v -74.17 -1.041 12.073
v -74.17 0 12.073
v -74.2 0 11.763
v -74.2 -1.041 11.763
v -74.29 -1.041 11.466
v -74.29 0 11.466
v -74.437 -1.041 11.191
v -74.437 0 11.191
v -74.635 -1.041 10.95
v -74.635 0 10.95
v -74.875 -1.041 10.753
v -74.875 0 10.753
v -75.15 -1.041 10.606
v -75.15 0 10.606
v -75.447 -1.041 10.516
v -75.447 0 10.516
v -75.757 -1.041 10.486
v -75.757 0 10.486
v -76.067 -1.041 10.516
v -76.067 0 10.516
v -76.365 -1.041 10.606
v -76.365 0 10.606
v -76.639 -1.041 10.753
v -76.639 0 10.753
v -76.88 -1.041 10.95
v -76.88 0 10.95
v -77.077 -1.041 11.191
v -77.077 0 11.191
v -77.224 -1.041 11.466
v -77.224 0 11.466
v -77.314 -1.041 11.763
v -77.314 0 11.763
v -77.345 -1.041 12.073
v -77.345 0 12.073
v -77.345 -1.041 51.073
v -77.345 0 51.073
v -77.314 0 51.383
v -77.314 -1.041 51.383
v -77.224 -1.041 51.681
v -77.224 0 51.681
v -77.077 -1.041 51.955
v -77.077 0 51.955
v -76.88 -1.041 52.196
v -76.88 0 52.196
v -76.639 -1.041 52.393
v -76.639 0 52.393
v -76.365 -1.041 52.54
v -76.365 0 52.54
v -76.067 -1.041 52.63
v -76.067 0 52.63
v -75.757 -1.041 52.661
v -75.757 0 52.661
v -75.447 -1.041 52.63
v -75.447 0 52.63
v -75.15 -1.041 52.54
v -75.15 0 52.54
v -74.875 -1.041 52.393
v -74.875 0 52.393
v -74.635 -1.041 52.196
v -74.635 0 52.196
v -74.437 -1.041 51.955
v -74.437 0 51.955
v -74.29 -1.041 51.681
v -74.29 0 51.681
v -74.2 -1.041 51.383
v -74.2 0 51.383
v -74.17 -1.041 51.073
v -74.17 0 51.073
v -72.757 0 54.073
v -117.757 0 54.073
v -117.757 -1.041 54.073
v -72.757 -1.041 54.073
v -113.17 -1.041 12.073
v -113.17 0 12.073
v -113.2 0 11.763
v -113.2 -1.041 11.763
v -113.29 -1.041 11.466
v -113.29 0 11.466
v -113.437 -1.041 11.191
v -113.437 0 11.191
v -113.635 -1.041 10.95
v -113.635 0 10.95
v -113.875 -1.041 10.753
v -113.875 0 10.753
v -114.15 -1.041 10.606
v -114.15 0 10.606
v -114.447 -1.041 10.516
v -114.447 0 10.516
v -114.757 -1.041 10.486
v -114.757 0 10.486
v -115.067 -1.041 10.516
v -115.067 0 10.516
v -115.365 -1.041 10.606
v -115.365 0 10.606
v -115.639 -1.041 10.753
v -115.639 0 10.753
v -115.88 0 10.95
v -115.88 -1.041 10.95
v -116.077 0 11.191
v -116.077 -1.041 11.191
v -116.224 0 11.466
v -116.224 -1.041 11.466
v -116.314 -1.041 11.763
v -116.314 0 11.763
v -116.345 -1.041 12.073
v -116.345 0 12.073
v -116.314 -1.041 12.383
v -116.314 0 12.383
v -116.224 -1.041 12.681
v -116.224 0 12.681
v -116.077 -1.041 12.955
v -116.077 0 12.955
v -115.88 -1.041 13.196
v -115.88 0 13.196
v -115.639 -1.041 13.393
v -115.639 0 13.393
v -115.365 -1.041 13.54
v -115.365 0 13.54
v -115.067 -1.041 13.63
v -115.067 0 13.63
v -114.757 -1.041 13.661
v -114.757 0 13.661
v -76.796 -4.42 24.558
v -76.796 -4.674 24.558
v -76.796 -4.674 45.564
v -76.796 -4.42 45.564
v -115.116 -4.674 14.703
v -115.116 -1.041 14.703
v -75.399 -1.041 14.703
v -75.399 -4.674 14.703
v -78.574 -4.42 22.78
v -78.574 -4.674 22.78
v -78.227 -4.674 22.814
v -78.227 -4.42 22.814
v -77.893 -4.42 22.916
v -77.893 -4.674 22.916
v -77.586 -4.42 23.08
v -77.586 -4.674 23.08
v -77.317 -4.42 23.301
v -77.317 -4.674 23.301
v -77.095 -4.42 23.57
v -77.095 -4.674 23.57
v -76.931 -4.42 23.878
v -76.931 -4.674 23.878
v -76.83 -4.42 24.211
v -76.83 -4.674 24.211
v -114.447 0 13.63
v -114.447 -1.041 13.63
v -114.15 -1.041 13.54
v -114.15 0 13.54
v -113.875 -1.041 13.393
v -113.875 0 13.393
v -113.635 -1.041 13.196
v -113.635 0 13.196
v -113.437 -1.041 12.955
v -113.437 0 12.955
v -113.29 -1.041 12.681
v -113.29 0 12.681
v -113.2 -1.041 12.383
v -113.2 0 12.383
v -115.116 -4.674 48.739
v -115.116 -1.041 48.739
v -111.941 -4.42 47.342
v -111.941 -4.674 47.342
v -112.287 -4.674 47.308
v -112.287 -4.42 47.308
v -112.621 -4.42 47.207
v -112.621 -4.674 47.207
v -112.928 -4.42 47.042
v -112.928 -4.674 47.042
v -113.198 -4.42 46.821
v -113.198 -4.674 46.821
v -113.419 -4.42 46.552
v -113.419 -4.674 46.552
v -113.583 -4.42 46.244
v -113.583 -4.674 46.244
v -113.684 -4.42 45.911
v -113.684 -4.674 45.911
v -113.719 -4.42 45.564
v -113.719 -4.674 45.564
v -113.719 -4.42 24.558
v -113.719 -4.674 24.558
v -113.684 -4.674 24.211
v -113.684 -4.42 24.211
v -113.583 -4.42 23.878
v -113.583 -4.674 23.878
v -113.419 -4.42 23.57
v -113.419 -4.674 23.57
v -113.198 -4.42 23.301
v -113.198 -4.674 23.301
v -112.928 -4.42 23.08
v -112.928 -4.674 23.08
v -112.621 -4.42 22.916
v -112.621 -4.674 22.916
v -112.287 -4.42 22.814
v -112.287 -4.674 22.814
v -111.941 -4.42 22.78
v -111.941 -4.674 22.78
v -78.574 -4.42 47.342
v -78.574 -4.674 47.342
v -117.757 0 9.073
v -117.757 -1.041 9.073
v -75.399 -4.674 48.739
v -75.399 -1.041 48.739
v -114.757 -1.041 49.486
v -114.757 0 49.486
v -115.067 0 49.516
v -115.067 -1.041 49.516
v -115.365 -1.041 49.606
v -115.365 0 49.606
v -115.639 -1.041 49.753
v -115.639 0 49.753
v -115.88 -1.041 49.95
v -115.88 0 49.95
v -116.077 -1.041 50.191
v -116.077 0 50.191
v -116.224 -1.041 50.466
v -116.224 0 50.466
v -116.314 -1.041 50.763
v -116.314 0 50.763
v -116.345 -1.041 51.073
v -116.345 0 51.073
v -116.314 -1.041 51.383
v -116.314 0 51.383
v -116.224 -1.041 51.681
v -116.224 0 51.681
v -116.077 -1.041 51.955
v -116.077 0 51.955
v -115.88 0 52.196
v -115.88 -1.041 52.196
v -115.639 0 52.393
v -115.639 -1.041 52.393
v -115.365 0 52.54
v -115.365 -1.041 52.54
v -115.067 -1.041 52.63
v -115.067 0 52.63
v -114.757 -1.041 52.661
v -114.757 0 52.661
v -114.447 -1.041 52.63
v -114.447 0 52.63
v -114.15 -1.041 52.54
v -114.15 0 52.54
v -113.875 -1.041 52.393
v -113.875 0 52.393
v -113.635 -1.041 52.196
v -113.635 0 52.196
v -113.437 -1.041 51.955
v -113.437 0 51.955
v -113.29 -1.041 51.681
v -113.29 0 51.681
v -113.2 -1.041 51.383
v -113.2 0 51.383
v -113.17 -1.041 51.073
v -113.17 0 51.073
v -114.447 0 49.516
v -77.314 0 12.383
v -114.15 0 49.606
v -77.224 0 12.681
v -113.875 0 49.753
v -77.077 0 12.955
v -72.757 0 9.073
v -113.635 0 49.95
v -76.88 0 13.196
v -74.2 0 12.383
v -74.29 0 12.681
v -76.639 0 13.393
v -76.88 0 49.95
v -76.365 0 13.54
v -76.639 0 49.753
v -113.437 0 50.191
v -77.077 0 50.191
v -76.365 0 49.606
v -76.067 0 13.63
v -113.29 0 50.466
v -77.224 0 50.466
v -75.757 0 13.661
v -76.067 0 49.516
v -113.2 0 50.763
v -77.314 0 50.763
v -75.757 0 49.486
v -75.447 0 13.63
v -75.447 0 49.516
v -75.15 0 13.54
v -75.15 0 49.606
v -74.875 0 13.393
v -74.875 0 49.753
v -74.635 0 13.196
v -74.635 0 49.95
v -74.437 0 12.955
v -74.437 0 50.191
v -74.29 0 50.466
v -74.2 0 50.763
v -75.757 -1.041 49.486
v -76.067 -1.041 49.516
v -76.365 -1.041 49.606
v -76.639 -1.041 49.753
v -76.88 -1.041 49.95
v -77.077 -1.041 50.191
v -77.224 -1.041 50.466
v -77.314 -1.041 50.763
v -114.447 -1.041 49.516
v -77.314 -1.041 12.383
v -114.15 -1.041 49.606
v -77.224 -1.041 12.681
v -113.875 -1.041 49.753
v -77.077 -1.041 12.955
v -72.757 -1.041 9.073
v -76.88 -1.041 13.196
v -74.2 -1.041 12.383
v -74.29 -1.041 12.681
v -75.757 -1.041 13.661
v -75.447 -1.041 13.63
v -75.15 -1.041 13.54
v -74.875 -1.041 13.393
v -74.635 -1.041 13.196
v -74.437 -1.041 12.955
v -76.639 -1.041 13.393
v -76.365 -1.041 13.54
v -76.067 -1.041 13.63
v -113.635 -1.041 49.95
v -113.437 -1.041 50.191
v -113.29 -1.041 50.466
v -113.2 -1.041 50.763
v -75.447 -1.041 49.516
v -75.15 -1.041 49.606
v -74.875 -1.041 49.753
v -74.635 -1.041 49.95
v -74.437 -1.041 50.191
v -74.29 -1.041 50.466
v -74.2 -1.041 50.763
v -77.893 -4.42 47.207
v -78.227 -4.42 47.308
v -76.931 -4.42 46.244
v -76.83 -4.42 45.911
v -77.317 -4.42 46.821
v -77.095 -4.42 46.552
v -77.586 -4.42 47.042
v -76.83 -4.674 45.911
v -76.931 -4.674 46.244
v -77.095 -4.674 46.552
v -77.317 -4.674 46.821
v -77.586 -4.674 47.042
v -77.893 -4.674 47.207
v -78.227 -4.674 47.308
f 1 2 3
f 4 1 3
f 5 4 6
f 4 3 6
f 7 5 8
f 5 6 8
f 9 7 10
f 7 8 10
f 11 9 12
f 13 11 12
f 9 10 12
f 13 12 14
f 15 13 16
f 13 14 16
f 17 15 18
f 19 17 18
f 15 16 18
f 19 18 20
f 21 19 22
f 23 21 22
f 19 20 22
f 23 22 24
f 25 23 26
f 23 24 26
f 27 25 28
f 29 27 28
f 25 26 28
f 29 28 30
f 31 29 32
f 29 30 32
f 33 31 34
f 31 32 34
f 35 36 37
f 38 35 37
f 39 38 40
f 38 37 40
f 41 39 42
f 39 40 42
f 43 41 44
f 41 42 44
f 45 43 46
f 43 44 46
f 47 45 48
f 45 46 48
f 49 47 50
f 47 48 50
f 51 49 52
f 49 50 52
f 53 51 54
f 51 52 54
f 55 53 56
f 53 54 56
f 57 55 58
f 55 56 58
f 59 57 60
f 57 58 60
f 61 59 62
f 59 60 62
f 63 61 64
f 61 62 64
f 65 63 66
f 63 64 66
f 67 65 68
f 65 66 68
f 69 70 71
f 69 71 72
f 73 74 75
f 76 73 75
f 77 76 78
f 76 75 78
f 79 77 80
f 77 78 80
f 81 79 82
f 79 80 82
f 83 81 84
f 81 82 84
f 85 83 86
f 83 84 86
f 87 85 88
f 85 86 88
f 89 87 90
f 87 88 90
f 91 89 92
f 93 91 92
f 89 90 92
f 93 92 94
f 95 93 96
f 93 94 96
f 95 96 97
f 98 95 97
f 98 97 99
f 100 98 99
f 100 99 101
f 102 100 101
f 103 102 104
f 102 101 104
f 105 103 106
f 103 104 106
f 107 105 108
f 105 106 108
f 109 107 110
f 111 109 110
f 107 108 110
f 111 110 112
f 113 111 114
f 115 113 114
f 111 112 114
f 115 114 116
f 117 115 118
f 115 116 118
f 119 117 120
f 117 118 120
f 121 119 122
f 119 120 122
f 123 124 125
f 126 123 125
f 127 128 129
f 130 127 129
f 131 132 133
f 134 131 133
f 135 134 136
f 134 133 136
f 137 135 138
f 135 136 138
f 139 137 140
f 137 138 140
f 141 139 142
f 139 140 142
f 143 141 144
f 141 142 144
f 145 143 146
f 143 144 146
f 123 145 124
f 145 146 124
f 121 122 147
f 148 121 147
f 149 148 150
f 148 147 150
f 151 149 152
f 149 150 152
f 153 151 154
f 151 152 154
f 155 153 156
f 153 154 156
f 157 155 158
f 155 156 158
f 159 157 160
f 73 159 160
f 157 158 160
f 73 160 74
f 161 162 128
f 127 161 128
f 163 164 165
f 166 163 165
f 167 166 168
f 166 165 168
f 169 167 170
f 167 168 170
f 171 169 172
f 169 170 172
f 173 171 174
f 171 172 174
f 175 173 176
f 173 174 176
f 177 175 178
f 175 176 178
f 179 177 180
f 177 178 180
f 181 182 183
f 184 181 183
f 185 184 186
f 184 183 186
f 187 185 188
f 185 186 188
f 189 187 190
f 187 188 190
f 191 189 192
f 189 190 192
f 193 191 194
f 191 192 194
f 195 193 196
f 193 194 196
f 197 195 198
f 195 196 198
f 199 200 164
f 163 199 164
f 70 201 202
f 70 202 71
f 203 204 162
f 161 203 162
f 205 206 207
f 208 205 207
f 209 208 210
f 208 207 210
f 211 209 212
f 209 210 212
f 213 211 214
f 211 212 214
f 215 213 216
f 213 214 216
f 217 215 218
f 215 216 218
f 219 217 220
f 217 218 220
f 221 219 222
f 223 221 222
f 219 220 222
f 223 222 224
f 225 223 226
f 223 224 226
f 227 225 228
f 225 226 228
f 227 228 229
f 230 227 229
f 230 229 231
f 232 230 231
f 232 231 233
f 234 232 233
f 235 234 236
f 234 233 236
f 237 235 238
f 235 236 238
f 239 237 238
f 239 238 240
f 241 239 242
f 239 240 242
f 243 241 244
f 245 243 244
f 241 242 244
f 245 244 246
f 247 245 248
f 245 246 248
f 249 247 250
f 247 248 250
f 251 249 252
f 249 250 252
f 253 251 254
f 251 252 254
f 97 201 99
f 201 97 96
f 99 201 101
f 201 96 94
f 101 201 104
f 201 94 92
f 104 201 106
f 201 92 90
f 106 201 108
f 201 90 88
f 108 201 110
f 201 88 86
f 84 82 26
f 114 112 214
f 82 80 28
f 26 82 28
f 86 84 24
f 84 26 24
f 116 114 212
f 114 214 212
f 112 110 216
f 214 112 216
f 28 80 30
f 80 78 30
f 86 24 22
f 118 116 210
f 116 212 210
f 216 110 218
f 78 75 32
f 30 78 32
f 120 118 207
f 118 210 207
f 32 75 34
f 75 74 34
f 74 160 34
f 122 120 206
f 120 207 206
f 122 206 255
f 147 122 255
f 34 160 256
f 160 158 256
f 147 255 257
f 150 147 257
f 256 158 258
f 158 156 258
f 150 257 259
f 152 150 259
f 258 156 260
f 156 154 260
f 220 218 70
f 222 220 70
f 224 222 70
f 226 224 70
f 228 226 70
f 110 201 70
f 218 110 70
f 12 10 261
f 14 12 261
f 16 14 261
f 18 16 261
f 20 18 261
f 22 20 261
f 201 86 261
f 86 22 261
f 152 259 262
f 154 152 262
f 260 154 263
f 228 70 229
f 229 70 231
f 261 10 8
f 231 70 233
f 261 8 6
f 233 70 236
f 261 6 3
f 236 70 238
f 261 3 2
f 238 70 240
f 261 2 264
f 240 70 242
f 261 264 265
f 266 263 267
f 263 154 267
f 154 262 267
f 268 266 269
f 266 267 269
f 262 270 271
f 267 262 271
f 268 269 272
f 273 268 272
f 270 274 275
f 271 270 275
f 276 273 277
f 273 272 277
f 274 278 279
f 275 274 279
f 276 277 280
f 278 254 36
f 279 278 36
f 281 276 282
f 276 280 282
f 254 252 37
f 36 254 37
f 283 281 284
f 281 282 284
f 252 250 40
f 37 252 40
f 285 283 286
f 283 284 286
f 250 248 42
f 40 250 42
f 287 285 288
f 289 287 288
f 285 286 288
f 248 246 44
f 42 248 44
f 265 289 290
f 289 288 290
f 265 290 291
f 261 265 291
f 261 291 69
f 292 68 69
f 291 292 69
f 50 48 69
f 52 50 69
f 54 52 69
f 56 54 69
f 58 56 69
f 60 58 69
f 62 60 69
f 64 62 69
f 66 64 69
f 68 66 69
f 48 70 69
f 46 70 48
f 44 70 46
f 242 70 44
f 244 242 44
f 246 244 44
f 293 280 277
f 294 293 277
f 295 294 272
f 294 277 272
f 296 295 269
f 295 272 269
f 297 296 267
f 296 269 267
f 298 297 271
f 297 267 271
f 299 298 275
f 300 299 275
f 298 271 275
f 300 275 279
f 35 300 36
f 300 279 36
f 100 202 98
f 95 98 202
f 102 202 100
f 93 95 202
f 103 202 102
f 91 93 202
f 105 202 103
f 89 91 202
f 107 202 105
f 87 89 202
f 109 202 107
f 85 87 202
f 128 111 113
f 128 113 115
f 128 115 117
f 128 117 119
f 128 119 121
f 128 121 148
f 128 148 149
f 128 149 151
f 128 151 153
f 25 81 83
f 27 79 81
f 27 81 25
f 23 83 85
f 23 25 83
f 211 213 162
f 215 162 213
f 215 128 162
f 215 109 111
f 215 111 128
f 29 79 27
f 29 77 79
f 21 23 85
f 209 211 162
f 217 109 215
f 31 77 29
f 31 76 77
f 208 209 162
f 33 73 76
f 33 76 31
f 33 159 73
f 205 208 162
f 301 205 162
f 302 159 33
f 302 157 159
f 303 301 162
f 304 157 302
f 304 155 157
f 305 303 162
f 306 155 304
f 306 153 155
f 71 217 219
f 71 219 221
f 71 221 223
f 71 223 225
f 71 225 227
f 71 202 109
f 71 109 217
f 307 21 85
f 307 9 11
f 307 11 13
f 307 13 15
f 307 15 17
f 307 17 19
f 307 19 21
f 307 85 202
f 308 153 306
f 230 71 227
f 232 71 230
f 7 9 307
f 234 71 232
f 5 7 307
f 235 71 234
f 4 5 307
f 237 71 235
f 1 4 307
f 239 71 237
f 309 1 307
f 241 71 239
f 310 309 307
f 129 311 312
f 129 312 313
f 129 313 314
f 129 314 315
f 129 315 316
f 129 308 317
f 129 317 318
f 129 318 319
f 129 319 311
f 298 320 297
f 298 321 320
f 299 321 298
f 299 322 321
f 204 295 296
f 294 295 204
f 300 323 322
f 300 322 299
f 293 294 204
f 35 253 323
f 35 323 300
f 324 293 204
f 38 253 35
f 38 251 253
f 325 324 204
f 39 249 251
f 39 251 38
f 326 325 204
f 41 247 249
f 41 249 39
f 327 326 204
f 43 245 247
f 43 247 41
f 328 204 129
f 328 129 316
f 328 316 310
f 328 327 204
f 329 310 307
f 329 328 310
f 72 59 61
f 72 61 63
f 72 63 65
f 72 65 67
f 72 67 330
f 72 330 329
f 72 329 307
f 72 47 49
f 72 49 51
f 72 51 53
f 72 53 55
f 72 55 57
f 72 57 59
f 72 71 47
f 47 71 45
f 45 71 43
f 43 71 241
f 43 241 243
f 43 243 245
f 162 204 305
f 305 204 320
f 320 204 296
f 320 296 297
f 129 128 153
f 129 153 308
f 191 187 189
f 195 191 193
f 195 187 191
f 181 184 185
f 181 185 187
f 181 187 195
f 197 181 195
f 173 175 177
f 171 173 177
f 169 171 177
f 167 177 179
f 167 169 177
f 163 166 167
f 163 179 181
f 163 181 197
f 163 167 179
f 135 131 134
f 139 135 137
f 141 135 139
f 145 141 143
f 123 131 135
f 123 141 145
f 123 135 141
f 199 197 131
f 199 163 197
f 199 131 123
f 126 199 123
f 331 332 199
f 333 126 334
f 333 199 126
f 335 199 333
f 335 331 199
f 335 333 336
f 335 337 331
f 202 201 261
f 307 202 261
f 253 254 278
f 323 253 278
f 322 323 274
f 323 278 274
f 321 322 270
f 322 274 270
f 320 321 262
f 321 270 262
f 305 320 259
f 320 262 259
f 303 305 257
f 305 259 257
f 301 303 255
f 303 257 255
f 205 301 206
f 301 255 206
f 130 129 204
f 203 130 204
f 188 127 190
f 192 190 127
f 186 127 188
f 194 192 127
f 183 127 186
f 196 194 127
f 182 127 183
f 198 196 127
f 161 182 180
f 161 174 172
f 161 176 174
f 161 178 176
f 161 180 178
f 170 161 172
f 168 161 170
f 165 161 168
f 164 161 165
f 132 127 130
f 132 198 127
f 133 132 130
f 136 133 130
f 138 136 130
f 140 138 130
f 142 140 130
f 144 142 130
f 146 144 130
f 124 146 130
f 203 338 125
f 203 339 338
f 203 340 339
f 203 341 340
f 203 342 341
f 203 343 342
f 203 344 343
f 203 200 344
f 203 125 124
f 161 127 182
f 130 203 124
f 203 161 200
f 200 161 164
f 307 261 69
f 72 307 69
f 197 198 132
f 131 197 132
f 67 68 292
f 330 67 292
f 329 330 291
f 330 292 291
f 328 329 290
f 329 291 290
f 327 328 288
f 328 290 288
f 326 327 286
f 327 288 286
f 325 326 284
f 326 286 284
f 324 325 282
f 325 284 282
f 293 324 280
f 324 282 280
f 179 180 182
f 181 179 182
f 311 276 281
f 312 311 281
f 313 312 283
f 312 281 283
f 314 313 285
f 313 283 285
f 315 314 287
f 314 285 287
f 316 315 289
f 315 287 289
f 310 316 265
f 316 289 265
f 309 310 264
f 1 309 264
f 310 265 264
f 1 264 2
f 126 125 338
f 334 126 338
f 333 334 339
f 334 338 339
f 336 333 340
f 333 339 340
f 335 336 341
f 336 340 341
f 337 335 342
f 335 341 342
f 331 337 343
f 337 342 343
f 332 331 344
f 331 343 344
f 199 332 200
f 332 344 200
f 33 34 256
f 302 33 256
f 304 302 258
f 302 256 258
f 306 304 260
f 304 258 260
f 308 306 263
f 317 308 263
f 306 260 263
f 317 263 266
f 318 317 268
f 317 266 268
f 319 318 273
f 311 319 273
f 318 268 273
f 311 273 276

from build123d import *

# Parameters (mm, degrees)
F0_W     = 45
F0_H     = 45
F1_DEPTH = 1.0414
F2_DEPTH = 4.6736
F4_DEPTH = 0.254


with BuildPart() as f1:
    # F0 (on Front) → F1 (new body)
    with BuildSketch(Plane.XZ):
        with Locations((-95.2571389369, 31.5730149047)):
            Rectangle(F0_W, F0_H)
        with BuildLine():
            ThreePointArc((-114.7571389369, 49.4855149047), (-115.879670952, 52.1955469198), (-113.1696389369, 51.0730149047))
            Line((-113.1696389369, 51.0730149047), (-77.3446389369, 51.0730149047))
            ThreePointArc((-77.3446389369, 51.0730149047), (-75.7571389369, 52.6605149047), (-74.1696389369, 51.0730149047))
            ThreePointArc((-74.1696389369, 51.0730149047), (-74.6346069217, 49.9504828895), (-75.7571389369, 49.4855149047))
            Line((-75.7571389369, 49.4855149047), (-75.7571389369, 48.7390149047))
            Line((-75.7571389369, 48.7390149047), (-75.3987389369, 48.7390149047))
            Line((-75.3987389369, 48.7390149047), (-75.3987389369, 14.7030149047))
            Line((-75.3987389369, 14.7030149047), (-75.7571389369, 14.7030149047))
            Line((-75.7571389369, 14.7030149047), (-75.7571389369, 13.6605149047))
            ThreePointArc((-75.7571389369, 13.6605149047), (-74.6346069217, 13.1955469198), (-74.1696389369, 12.0730149047))
            ThreePointArc((-74.1696389369, 12.0730149047), (-75.7571389369, 10.4855149047), (-77.3446389369, 12.0730149047))
            Line((-77.3446389369, 12.0730149047), (-113.1696389369, 12.0730149047))
            ThreePointArc((-113.1696389369, 12.0730149047), (-115.879670952, 10.9504828895), (-114.7571389369, 13.6605149047))
            Line((-114.7571389369, 13.6605149047), (-114.7571389369, 14.7030149047))
            Line((-114.7571389369, 14.7030149047), (-115.1155389369, 14.7030149047))
            Line((-115.1155389369, 14.7030149047), (-115.1155389369, 48.7390149047))
            Line((-115.1155389369, 48.7390149047), (-114.7571389369, 48.7390149047))
            Line((-114.7571389369, 48.7390149047), (-114.7571389369, 49.4855149047))
        make_face(mode=Mode.SUBTRACT)
        with BuildLine():
            Line((-77.3446389369, 51.0730149047), (-113.1696389369, 51.0730149047))
            ThreePointArc((-113.1696389369, 51.0730149047), (-113.6346069217, 49.9504828895), (-114.7571389369, 49.4855149047))
            Line((-114.7571389369, 49.4855149047), (-114.7571389369, 48.7390149047))
            Line((-114.7571389369, 48.7390149047), (-75.7571389369, 48.7390149047))
            Line((-75.7571389369, 48.7390149047), (-75.7571389369, 49.4855149047))
            ThreePointArc((-75.7571389369, 49.4855149047), (-76.879670952, 49.9504828895), (-77.3446389369, 51.0730149047))
        make_face()
        with BuildLine():
            Line((-75.7571389369, 14.7030149047), (-114.7571389369, 14.7030149047))
            Line((-114.7571389369, 14.7030149047), (-114.7571389369, 13.6605149047))
            ThreePointArc((-114.7571389369, 13.6605149047), (-113.6346069217, 13.1955469198), (-113.1696389369, 12.0730149047))
            Line((-113.1696389369, 12.0730149047), (-77.3446389369, 12.0730149047))
            ThreePointArc((-77.3446389369, 12.0730149047), (-76.879670952, 13.1955469198), (-75.7571389369, 13.6605149047))
            Line((-75.7571389369, 13.6605149047), (-75.7571389369, 14.7030149047))
        make_face()
    extrude(amount=F1_DEPTH)

    # F0 (on Front) → F2 (join)
    with BuildSketch(Plane.XZ):
        Polygon((-75.7571389369, 48.7390149047), (-114.7571389369, 48.7390149047), (-115.1155389369, 48.7390149047), (-115.1155389369, 14.7030149047), (-114.7571389369, 14.7030149047), (-75.7571389369, 14.7030149047), (-75.3987389369, 14.7030149047), (-75.3987389369, 48.7390149047), align=None)
    extrude(amount=F2_DEPTH)

    # F3 (on face) → F4 (cut)
    with BuildSketch(Plane.XZ.offset(4.6736)):
        with BuildLine():
            Line((-78.5737389369, 47.3420149047), (-111.9405389369, 47.3420149047))
            ThreePointArc((-111.9405389369, 47.3420149047), (-113.1977747938, 46.8212507616), (-113.7185389369, 45.5640149047))
            Line((-113.7185389369, 45.5640149047), (-113.7185389369, 24.5582149047))
            ThreePointArc((-113.7185389369, 24.5582149047), (-113.1977747938, 23.3009790477), (-111.9405389369, 22.7802149047))
            Line((-111.9405389369, 22.7802149047), (-78.5737389369, 22.7802149047))
            ThreePointArc((-78.5737389369, 22.7802149047), (-77.3165030799, 23.3009790477), (-76.7957389369, 24.5582149047))
            Line((-76.7957389369, 24.5582149047), (-76.7957389369, 45.5640149047))
            ThreePointArc((-76.7957389369, 45.5640149047), (-77.3165030799, 46.8212507616), (-78.5737389369, 47.3420149047))
        make_face()
    extrude(amount=-F4_DEPTH, mode=Mode.SUBTRACT)


solid = f1.part
